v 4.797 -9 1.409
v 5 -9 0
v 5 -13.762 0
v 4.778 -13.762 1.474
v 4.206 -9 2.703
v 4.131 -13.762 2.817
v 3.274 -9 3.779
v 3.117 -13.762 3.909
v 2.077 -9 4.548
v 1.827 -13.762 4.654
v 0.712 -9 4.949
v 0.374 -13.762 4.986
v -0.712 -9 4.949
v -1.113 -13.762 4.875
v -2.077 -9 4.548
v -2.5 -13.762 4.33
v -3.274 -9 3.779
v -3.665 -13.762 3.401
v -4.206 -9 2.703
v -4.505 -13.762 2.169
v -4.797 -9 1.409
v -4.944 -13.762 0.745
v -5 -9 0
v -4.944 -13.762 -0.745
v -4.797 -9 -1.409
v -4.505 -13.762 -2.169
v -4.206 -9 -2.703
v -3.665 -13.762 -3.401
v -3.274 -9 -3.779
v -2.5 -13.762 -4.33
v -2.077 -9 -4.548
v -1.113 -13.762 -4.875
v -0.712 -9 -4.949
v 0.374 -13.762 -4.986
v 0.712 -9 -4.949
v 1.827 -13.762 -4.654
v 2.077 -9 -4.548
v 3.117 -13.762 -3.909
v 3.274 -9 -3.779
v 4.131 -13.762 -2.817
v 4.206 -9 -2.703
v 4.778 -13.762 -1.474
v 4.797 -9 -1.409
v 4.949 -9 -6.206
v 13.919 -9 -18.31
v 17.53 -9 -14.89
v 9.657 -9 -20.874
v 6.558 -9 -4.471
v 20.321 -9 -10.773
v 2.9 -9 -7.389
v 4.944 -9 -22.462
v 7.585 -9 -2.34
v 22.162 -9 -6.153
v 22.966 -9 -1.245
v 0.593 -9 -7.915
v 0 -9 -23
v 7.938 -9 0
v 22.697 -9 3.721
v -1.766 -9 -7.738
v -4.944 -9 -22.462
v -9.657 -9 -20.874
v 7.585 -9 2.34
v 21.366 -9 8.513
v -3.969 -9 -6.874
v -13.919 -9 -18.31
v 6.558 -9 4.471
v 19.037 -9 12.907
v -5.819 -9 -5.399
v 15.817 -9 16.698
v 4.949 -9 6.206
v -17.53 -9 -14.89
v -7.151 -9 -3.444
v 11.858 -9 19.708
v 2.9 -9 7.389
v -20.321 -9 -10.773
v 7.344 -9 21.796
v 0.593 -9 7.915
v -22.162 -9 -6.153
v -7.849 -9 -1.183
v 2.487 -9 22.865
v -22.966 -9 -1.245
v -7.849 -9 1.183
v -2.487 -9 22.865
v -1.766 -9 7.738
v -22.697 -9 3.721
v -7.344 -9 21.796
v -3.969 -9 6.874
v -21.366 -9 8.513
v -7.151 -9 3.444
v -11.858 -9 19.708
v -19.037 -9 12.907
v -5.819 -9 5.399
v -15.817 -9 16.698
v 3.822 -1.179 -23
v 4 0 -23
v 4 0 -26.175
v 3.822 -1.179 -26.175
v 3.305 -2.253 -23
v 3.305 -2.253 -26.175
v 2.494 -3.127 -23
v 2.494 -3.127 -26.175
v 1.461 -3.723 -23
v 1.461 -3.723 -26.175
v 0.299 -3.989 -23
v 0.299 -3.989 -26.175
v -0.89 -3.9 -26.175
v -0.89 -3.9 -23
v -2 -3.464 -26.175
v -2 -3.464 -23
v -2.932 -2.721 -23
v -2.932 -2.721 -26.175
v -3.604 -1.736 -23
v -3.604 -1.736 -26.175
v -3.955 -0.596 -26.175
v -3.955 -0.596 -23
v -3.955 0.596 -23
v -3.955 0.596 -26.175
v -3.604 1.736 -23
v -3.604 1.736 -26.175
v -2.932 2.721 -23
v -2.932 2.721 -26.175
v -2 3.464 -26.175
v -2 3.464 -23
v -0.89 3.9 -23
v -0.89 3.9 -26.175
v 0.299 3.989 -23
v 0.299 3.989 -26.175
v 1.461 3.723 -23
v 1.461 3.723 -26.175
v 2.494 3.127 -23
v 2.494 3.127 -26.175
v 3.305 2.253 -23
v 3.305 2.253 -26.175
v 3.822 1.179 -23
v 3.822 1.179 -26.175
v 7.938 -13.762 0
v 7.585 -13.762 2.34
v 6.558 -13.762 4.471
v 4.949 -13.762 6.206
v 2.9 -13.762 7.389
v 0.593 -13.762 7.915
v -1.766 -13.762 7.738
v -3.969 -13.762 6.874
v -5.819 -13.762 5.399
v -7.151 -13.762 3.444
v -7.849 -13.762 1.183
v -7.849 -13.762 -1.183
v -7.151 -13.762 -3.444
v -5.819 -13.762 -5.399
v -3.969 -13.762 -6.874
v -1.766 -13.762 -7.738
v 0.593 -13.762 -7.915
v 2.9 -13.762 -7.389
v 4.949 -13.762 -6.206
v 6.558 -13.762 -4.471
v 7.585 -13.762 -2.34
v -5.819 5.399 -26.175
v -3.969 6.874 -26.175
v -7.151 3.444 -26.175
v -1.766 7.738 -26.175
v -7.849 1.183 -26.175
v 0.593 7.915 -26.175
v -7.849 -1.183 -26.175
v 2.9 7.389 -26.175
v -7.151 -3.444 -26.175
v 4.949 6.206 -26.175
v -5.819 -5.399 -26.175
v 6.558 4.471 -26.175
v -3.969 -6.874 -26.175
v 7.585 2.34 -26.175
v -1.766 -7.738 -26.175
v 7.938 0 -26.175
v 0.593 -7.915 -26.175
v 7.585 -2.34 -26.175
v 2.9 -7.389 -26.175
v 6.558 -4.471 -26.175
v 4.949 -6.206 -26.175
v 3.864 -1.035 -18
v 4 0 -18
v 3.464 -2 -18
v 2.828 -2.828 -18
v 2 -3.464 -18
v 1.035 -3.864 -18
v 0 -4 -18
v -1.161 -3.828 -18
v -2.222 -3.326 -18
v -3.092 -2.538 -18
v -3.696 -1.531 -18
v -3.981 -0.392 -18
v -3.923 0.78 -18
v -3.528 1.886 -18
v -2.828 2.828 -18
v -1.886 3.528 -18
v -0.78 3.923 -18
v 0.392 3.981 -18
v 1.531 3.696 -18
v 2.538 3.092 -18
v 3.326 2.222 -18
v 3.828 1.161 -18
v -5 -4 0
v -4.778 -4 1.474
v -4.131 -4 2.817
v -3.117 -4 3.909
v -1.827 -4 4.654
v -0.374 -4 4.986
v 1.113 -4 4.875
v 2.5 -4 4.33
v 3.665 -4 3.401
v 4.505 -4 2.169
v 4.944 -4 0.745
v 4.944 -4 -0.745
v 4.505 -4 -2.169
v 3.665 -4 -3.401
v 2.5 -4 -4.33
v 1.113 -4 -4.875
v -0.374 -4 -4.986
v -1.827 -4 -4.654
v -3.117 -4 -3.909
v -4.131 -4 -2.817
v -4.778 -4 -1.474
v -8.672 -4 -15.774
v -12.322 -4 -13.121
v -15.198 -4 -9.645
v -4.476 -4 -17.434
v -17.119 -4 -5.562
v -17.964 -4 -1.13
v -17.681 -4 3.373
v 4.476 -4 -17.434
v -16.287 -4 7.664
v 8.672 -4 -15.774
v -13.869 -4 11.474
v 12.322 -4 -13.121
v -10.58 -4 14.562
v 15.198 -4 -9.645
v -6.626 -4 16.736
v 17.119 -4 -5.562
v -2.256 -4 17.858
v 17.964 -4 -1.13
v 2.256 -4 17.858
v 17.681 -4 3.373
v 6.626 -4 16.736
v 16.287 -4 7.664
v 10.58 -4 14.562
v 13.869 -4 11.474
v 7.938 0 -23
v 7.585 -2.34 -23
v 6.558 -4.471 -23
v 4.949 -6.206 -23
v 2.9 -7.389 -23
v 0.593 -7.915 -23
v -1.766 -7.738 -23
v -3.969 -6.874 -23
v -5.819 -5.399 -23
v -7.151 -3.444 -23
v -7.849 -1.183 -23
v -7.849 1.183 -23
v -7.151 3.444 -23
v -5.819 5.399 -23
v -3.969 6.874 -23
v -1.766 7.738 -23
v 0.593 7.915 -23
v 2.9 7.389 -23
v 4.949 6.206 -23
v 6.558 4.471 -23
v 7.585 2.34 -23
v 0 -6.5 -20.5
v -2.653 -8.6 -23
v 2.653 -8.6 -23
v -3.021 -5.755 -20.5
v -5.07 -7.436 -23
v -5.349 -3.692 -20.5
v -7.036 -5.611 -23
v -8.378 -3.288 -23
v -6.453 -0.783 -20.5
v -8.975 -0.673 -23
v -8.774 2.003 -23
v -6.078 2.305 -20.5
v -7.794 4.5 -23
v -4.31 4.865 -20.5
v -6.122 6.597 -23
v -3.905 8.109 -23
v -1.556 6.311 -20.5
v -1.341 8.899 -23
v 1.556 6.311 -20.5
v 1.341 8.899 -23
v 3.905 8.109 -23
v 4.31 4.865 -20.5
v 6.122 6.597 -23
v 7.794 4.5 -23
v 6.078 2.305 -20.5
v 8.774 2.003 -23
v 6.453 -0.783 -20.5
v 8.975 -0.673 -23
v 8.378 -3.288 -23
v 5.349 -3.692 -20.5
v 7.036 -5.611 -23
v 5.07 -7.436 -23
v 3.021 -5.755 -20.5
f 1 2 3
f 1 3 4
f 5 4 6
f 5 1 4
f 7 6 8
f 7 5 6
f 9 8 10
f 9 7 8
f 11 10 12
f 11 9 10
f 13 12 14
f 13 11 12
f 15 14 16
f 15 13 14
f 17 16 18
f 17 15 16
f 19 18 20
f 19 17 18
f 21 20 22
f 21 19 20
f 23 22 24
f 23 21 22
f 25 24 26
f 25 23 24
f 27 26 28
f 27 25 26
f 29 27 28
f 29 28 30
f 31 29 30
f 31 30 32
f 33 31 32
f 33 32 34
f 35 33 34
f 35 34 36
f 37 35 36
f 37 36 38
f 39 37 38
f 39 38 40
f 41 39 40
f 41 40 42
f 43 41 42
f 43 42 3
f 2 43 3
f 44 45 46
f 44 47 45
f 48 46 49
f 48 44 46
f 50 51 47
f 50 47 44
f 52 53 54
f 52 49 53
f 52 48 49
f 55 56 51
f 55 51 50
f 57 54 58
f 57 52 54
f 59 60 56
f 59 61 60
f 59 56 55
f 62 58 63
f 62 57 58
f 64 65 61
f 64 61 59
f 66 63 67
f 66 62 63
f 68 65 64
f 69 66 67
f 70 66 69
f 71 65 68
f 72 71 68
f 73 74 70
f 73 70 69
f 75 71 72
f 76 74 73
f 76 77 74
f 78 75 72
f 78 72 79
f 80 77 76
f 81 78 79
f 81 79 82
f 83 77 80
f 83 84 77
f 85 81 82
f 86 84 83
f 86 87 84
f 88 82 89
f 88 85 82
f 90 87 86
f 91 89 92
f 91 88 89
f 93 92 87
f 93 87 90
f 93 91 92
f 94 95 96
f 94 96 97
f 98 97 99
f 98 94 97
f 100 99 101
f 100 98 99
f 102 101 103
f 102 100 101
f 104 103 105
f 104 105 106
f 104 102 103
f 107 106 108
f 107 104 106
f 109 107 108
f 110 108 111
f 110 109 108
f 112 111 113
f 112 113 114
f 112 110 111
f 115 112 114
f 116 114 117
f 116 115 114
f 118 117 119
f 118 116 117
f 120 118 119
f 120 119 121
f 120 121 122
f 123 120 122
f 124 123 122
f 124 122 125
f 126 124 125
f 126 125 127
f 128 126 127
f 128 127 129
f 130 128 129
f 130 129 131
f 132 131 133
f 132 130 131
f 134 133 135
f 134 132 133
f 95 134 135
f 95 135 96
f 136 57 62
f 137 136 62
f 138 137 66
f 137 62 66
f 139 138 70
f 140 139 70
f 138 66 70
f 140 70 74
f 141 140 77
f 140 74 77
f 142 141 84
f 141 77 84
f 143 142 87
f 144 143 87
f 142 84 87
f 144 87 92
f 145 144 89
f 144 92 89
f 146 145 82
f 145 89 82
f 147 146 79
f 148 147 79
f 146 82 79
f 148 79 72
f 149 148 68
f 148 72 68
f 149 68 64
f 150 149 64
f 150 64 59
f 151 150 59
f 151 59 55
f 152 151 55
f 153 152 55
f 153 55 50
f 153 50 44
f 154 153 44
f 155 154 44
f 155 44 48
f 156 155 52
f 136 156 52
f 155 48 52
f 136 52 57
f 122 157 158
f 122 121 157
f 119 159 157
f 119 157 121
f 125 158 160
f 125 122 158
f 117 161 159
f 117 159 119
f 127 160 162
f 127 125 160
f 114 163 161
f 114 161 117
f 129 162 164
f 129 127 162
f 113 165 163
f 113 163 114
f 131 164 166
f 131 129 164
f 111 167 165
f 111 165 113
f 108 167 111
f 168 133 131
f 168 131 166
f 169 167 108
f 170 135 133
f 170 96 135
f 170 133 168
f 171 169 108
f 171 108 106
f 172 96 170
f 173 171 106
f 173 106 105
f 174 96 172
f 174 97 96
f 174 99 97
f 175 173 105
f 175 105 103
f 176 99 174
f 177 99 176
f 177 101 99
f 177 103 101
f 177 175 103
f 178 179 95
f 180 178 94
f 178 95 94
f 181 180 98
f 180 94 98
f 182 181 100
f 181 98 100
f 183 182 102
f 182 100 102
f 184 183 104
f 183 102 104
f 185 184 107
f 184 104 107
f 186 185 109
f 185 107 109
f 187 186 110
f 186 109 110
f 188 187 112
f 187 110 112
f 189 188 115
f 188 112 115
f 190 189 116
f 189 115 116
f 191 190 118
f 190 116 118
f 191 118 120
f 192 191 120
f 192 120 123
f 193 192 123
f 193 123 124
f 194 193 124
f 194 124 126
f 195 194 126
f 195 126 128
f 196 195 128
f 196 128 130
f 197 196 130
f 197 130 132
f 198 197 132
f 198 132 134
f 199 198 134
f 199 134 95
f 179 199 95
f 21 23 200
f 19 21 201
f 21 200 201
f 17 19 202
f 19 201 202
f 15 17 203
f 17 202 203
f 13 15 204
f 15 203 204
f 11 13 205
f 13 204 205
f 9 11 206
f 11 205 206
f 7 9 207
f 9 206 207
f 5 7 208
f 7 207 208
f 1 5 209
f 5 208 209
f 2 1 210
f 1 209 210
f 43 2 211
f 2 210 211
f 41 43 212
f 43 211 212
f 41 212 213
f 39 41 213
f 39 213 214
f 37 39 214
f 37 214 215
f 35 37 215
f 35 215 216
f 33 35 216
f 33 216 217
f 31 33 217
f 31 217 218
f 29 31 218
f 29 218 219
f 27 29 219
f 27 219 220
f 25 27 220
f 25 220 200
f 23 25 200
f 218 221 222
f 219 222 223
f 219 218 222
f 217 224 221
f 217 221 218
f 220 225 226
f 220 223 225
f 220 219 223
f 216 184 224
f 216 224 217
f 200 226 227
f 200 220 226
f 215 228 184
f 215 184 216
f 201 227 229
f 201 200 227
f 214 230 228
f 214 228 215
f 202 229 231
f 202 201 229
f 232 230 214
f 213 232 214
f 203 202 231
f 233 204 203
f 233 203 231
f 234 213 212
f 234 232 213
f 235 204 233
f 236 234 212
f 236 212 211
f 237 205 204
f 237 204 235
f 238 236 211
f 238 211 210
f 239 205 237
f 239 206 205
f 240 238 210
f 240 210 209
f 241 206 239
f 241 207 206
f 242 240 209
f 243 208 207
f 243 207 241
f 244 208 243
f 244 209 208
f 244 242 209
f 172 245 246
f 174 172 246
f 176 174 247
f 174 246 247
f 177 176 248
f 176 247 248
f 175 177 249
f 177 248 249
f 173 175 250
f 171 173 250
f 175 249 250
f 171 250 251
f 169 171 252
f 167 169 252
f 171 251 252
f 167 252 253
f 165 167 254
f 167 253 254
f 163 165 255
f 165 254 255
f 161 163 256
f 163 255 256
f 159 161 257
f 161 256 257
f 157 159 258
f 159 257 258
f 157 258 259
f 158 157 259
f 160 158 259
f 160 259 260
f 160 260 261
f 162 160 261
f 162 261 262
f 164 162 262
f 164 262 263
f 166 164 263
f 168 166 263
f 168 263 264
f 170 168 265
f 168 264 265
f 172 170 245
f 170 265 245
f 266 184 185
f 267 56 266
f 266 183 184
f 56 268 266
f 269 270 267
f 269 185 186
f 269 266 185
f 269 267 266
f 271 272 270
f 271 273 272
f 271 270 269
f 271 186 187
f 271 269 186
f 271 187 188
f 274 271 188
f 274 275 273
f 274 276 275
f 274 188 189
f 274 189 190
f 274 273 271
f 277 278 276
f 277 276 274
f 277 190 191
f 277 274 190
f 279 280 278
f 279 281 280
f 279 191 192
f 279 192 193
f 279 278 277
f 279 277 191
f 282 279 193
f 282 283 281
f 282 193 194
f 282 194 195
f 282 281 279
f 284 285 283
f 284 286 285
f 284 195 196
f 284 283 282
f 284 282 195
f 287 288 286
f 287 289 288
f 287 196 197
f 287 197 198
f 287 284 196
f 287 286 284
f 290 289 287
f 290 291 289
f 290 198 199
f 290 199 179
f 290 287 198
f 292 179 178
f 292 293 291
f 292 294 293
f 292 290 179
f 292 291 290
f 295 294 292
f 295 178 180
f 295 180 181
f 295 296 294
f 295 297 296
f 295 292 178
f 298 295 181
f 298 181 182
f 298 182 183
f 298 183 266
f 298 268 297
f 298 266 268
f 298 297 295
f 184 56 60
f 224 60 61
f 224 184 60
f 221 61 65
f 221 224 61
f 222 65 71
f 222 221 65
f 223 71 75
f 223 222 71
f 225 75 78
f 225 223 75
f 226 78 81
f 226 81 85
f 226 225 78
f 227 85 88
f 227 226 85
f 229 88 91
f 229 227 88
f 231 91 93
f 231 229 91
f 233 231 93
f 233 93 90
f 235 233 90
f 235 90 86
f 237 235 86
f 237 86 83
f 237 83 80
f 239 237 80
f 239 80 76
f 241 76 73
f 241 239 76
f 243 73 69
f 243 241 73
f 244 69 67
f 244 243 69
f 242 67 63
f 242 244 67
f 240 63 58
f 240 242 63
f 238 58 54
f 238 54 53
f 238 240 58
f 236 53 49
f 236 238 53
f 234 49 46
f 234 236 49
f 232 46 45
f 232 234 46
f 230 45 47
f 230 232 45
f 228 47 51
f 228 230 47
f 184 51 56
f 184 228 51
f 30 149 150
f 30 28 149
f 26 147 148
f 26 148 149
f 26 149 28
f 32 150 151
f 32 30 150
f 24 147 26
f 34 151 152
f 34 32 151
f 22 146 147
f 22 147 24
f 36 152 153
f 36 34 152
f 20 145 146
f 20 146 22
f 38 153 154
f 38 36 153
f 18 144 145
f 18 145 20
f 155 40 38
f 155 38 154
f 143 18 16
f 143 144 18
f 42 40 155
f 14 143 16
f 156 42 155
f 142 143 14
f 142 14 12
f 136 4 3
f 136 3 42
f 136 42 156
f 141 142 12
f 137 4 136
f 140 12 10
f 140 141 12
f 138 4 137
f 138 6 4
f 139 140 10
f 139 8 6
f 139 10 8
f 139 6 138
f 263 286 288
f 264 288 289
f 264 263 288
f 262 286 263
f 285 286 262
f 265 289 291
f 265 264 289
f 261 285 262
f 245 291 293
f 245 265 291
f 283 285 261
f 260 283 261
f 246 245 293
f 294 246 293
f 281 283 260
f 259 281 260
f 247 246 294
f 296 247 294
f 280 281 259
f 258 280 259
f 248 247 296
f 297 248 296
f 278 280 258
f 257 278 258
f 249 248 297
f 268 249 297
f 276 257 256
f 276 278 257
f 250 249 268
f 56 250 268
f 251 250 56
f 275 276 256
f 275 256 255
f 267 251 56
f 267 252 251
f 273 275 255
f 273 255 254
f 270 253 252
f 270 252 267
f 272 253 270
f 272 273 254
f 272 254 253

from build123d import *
from build123d import SkipClean  # not in build123d's __all__

# Parameters (mm, degrees)
F3_R          = 5
F4_DEPTH      = 7.621
F5_R          = 4
F6_DEPTH      = 46.001
F7_W          = 8
F7_H          = 36
F8_DEPTH      = 23.0010001
F8_DEPTH_BACK = 23.0010001
F9_R          = 7.9375
F9_R_2        = 4
F10_DEPTH     = 3.175
F11_R         = 7.9375
F11_R_2       = 5
F12_DEPTH     = 4.7625


with BuildPart() as f1:
    # F0 (on Right) → F1 (revolve)
    with BuildSketch(Plane.YZ):
        Polygon((-1.38, 0), (-9, 0), (-9, -23), (-1.38, -15.38), align=None)
    revolve(axis=Axis((0, -5.19, 0), (0, 1, 0)))

    # F3 (on face) → F4 (cut, through all)
    with BuildSketch(Plane(origin=(0, -1.38, 0), x_dir=(-1, 0, 0), z_dir=(0, 1, 0))):
        Circle(F3_R)
    extrude(amount=-F4_DEPTH, mode=Mode.SUBTRACT)


with BuildPart() as f2:
    # F0 (on Right) → F2 (revolve)
    with BuildSketch(Plane.YZ):
        Polygon((-1.38, -15.38), (-9, -23), (0, -23), (0, -15.38), align=None)
    revolve(axis=Axis((0, 0, -19.19), (0, 0, -1)))


with BuildPart() as f6_tool:
    # F5 (on face) → F6 (new body, through all)
    with BuildSketch(Plane(origin=(0, 0, -23), x_dir=(1, 0, 0), z_dir=(0, 0, -1))):
        Circle(F5_R)
    extrude(amount=-F6_DEPTH)


with BuildPart() as f1_1:
    add(f1.part, clean=False)

    # F6: cut by f6_tool
    add(f6_tool.part, mode=Mode.SUBTRACT)

    # F7 (on Right) → F8 (cut, two sides)
    with BuildSketch(Plane.YZ) as f8_sk:
        Rectangle(F7_W, F7_H)
    extrude(amount=-F8_DEPTH, mode=Mode.SUBTRACT)
    extrude(f8_sk.sketch, amount=F8_DEPTH_BACK, mode=Mode.SUBTRACT)

    # F11 (on face) → F12 (join)
    with BuildSketch(Plane.XZ.offset(9)):
        Circle(F11_R)
        Circle(F11_R_2, mode=Mode.SUBTRACT)
    with SkipClean():  # cleaning this boolean's faces spoils the solid; the shape is the same uncleaned
        extrude(amount=F12_DEPTH)


with BuildPart() as f2_1:
    add(f2.part, clean=False)

    # F6: cut by f6_tool
    add(f6_tool.part, mode=Mode.SUBTRACT)

    # F9 (on face) → F10 (join)
    with BuildSketch(Plane(origin=(0, 0, -23), x_dir=(1, 0, 0), z_dir=(0, 0, -1))):
        Circle(F9_R)
        Circle(F9_R_2, mode=Mode.SUBTRACT)
    extrude(amount=F10_DEPTH)


solid = Compound([f1_1.part, f2_1.part])
